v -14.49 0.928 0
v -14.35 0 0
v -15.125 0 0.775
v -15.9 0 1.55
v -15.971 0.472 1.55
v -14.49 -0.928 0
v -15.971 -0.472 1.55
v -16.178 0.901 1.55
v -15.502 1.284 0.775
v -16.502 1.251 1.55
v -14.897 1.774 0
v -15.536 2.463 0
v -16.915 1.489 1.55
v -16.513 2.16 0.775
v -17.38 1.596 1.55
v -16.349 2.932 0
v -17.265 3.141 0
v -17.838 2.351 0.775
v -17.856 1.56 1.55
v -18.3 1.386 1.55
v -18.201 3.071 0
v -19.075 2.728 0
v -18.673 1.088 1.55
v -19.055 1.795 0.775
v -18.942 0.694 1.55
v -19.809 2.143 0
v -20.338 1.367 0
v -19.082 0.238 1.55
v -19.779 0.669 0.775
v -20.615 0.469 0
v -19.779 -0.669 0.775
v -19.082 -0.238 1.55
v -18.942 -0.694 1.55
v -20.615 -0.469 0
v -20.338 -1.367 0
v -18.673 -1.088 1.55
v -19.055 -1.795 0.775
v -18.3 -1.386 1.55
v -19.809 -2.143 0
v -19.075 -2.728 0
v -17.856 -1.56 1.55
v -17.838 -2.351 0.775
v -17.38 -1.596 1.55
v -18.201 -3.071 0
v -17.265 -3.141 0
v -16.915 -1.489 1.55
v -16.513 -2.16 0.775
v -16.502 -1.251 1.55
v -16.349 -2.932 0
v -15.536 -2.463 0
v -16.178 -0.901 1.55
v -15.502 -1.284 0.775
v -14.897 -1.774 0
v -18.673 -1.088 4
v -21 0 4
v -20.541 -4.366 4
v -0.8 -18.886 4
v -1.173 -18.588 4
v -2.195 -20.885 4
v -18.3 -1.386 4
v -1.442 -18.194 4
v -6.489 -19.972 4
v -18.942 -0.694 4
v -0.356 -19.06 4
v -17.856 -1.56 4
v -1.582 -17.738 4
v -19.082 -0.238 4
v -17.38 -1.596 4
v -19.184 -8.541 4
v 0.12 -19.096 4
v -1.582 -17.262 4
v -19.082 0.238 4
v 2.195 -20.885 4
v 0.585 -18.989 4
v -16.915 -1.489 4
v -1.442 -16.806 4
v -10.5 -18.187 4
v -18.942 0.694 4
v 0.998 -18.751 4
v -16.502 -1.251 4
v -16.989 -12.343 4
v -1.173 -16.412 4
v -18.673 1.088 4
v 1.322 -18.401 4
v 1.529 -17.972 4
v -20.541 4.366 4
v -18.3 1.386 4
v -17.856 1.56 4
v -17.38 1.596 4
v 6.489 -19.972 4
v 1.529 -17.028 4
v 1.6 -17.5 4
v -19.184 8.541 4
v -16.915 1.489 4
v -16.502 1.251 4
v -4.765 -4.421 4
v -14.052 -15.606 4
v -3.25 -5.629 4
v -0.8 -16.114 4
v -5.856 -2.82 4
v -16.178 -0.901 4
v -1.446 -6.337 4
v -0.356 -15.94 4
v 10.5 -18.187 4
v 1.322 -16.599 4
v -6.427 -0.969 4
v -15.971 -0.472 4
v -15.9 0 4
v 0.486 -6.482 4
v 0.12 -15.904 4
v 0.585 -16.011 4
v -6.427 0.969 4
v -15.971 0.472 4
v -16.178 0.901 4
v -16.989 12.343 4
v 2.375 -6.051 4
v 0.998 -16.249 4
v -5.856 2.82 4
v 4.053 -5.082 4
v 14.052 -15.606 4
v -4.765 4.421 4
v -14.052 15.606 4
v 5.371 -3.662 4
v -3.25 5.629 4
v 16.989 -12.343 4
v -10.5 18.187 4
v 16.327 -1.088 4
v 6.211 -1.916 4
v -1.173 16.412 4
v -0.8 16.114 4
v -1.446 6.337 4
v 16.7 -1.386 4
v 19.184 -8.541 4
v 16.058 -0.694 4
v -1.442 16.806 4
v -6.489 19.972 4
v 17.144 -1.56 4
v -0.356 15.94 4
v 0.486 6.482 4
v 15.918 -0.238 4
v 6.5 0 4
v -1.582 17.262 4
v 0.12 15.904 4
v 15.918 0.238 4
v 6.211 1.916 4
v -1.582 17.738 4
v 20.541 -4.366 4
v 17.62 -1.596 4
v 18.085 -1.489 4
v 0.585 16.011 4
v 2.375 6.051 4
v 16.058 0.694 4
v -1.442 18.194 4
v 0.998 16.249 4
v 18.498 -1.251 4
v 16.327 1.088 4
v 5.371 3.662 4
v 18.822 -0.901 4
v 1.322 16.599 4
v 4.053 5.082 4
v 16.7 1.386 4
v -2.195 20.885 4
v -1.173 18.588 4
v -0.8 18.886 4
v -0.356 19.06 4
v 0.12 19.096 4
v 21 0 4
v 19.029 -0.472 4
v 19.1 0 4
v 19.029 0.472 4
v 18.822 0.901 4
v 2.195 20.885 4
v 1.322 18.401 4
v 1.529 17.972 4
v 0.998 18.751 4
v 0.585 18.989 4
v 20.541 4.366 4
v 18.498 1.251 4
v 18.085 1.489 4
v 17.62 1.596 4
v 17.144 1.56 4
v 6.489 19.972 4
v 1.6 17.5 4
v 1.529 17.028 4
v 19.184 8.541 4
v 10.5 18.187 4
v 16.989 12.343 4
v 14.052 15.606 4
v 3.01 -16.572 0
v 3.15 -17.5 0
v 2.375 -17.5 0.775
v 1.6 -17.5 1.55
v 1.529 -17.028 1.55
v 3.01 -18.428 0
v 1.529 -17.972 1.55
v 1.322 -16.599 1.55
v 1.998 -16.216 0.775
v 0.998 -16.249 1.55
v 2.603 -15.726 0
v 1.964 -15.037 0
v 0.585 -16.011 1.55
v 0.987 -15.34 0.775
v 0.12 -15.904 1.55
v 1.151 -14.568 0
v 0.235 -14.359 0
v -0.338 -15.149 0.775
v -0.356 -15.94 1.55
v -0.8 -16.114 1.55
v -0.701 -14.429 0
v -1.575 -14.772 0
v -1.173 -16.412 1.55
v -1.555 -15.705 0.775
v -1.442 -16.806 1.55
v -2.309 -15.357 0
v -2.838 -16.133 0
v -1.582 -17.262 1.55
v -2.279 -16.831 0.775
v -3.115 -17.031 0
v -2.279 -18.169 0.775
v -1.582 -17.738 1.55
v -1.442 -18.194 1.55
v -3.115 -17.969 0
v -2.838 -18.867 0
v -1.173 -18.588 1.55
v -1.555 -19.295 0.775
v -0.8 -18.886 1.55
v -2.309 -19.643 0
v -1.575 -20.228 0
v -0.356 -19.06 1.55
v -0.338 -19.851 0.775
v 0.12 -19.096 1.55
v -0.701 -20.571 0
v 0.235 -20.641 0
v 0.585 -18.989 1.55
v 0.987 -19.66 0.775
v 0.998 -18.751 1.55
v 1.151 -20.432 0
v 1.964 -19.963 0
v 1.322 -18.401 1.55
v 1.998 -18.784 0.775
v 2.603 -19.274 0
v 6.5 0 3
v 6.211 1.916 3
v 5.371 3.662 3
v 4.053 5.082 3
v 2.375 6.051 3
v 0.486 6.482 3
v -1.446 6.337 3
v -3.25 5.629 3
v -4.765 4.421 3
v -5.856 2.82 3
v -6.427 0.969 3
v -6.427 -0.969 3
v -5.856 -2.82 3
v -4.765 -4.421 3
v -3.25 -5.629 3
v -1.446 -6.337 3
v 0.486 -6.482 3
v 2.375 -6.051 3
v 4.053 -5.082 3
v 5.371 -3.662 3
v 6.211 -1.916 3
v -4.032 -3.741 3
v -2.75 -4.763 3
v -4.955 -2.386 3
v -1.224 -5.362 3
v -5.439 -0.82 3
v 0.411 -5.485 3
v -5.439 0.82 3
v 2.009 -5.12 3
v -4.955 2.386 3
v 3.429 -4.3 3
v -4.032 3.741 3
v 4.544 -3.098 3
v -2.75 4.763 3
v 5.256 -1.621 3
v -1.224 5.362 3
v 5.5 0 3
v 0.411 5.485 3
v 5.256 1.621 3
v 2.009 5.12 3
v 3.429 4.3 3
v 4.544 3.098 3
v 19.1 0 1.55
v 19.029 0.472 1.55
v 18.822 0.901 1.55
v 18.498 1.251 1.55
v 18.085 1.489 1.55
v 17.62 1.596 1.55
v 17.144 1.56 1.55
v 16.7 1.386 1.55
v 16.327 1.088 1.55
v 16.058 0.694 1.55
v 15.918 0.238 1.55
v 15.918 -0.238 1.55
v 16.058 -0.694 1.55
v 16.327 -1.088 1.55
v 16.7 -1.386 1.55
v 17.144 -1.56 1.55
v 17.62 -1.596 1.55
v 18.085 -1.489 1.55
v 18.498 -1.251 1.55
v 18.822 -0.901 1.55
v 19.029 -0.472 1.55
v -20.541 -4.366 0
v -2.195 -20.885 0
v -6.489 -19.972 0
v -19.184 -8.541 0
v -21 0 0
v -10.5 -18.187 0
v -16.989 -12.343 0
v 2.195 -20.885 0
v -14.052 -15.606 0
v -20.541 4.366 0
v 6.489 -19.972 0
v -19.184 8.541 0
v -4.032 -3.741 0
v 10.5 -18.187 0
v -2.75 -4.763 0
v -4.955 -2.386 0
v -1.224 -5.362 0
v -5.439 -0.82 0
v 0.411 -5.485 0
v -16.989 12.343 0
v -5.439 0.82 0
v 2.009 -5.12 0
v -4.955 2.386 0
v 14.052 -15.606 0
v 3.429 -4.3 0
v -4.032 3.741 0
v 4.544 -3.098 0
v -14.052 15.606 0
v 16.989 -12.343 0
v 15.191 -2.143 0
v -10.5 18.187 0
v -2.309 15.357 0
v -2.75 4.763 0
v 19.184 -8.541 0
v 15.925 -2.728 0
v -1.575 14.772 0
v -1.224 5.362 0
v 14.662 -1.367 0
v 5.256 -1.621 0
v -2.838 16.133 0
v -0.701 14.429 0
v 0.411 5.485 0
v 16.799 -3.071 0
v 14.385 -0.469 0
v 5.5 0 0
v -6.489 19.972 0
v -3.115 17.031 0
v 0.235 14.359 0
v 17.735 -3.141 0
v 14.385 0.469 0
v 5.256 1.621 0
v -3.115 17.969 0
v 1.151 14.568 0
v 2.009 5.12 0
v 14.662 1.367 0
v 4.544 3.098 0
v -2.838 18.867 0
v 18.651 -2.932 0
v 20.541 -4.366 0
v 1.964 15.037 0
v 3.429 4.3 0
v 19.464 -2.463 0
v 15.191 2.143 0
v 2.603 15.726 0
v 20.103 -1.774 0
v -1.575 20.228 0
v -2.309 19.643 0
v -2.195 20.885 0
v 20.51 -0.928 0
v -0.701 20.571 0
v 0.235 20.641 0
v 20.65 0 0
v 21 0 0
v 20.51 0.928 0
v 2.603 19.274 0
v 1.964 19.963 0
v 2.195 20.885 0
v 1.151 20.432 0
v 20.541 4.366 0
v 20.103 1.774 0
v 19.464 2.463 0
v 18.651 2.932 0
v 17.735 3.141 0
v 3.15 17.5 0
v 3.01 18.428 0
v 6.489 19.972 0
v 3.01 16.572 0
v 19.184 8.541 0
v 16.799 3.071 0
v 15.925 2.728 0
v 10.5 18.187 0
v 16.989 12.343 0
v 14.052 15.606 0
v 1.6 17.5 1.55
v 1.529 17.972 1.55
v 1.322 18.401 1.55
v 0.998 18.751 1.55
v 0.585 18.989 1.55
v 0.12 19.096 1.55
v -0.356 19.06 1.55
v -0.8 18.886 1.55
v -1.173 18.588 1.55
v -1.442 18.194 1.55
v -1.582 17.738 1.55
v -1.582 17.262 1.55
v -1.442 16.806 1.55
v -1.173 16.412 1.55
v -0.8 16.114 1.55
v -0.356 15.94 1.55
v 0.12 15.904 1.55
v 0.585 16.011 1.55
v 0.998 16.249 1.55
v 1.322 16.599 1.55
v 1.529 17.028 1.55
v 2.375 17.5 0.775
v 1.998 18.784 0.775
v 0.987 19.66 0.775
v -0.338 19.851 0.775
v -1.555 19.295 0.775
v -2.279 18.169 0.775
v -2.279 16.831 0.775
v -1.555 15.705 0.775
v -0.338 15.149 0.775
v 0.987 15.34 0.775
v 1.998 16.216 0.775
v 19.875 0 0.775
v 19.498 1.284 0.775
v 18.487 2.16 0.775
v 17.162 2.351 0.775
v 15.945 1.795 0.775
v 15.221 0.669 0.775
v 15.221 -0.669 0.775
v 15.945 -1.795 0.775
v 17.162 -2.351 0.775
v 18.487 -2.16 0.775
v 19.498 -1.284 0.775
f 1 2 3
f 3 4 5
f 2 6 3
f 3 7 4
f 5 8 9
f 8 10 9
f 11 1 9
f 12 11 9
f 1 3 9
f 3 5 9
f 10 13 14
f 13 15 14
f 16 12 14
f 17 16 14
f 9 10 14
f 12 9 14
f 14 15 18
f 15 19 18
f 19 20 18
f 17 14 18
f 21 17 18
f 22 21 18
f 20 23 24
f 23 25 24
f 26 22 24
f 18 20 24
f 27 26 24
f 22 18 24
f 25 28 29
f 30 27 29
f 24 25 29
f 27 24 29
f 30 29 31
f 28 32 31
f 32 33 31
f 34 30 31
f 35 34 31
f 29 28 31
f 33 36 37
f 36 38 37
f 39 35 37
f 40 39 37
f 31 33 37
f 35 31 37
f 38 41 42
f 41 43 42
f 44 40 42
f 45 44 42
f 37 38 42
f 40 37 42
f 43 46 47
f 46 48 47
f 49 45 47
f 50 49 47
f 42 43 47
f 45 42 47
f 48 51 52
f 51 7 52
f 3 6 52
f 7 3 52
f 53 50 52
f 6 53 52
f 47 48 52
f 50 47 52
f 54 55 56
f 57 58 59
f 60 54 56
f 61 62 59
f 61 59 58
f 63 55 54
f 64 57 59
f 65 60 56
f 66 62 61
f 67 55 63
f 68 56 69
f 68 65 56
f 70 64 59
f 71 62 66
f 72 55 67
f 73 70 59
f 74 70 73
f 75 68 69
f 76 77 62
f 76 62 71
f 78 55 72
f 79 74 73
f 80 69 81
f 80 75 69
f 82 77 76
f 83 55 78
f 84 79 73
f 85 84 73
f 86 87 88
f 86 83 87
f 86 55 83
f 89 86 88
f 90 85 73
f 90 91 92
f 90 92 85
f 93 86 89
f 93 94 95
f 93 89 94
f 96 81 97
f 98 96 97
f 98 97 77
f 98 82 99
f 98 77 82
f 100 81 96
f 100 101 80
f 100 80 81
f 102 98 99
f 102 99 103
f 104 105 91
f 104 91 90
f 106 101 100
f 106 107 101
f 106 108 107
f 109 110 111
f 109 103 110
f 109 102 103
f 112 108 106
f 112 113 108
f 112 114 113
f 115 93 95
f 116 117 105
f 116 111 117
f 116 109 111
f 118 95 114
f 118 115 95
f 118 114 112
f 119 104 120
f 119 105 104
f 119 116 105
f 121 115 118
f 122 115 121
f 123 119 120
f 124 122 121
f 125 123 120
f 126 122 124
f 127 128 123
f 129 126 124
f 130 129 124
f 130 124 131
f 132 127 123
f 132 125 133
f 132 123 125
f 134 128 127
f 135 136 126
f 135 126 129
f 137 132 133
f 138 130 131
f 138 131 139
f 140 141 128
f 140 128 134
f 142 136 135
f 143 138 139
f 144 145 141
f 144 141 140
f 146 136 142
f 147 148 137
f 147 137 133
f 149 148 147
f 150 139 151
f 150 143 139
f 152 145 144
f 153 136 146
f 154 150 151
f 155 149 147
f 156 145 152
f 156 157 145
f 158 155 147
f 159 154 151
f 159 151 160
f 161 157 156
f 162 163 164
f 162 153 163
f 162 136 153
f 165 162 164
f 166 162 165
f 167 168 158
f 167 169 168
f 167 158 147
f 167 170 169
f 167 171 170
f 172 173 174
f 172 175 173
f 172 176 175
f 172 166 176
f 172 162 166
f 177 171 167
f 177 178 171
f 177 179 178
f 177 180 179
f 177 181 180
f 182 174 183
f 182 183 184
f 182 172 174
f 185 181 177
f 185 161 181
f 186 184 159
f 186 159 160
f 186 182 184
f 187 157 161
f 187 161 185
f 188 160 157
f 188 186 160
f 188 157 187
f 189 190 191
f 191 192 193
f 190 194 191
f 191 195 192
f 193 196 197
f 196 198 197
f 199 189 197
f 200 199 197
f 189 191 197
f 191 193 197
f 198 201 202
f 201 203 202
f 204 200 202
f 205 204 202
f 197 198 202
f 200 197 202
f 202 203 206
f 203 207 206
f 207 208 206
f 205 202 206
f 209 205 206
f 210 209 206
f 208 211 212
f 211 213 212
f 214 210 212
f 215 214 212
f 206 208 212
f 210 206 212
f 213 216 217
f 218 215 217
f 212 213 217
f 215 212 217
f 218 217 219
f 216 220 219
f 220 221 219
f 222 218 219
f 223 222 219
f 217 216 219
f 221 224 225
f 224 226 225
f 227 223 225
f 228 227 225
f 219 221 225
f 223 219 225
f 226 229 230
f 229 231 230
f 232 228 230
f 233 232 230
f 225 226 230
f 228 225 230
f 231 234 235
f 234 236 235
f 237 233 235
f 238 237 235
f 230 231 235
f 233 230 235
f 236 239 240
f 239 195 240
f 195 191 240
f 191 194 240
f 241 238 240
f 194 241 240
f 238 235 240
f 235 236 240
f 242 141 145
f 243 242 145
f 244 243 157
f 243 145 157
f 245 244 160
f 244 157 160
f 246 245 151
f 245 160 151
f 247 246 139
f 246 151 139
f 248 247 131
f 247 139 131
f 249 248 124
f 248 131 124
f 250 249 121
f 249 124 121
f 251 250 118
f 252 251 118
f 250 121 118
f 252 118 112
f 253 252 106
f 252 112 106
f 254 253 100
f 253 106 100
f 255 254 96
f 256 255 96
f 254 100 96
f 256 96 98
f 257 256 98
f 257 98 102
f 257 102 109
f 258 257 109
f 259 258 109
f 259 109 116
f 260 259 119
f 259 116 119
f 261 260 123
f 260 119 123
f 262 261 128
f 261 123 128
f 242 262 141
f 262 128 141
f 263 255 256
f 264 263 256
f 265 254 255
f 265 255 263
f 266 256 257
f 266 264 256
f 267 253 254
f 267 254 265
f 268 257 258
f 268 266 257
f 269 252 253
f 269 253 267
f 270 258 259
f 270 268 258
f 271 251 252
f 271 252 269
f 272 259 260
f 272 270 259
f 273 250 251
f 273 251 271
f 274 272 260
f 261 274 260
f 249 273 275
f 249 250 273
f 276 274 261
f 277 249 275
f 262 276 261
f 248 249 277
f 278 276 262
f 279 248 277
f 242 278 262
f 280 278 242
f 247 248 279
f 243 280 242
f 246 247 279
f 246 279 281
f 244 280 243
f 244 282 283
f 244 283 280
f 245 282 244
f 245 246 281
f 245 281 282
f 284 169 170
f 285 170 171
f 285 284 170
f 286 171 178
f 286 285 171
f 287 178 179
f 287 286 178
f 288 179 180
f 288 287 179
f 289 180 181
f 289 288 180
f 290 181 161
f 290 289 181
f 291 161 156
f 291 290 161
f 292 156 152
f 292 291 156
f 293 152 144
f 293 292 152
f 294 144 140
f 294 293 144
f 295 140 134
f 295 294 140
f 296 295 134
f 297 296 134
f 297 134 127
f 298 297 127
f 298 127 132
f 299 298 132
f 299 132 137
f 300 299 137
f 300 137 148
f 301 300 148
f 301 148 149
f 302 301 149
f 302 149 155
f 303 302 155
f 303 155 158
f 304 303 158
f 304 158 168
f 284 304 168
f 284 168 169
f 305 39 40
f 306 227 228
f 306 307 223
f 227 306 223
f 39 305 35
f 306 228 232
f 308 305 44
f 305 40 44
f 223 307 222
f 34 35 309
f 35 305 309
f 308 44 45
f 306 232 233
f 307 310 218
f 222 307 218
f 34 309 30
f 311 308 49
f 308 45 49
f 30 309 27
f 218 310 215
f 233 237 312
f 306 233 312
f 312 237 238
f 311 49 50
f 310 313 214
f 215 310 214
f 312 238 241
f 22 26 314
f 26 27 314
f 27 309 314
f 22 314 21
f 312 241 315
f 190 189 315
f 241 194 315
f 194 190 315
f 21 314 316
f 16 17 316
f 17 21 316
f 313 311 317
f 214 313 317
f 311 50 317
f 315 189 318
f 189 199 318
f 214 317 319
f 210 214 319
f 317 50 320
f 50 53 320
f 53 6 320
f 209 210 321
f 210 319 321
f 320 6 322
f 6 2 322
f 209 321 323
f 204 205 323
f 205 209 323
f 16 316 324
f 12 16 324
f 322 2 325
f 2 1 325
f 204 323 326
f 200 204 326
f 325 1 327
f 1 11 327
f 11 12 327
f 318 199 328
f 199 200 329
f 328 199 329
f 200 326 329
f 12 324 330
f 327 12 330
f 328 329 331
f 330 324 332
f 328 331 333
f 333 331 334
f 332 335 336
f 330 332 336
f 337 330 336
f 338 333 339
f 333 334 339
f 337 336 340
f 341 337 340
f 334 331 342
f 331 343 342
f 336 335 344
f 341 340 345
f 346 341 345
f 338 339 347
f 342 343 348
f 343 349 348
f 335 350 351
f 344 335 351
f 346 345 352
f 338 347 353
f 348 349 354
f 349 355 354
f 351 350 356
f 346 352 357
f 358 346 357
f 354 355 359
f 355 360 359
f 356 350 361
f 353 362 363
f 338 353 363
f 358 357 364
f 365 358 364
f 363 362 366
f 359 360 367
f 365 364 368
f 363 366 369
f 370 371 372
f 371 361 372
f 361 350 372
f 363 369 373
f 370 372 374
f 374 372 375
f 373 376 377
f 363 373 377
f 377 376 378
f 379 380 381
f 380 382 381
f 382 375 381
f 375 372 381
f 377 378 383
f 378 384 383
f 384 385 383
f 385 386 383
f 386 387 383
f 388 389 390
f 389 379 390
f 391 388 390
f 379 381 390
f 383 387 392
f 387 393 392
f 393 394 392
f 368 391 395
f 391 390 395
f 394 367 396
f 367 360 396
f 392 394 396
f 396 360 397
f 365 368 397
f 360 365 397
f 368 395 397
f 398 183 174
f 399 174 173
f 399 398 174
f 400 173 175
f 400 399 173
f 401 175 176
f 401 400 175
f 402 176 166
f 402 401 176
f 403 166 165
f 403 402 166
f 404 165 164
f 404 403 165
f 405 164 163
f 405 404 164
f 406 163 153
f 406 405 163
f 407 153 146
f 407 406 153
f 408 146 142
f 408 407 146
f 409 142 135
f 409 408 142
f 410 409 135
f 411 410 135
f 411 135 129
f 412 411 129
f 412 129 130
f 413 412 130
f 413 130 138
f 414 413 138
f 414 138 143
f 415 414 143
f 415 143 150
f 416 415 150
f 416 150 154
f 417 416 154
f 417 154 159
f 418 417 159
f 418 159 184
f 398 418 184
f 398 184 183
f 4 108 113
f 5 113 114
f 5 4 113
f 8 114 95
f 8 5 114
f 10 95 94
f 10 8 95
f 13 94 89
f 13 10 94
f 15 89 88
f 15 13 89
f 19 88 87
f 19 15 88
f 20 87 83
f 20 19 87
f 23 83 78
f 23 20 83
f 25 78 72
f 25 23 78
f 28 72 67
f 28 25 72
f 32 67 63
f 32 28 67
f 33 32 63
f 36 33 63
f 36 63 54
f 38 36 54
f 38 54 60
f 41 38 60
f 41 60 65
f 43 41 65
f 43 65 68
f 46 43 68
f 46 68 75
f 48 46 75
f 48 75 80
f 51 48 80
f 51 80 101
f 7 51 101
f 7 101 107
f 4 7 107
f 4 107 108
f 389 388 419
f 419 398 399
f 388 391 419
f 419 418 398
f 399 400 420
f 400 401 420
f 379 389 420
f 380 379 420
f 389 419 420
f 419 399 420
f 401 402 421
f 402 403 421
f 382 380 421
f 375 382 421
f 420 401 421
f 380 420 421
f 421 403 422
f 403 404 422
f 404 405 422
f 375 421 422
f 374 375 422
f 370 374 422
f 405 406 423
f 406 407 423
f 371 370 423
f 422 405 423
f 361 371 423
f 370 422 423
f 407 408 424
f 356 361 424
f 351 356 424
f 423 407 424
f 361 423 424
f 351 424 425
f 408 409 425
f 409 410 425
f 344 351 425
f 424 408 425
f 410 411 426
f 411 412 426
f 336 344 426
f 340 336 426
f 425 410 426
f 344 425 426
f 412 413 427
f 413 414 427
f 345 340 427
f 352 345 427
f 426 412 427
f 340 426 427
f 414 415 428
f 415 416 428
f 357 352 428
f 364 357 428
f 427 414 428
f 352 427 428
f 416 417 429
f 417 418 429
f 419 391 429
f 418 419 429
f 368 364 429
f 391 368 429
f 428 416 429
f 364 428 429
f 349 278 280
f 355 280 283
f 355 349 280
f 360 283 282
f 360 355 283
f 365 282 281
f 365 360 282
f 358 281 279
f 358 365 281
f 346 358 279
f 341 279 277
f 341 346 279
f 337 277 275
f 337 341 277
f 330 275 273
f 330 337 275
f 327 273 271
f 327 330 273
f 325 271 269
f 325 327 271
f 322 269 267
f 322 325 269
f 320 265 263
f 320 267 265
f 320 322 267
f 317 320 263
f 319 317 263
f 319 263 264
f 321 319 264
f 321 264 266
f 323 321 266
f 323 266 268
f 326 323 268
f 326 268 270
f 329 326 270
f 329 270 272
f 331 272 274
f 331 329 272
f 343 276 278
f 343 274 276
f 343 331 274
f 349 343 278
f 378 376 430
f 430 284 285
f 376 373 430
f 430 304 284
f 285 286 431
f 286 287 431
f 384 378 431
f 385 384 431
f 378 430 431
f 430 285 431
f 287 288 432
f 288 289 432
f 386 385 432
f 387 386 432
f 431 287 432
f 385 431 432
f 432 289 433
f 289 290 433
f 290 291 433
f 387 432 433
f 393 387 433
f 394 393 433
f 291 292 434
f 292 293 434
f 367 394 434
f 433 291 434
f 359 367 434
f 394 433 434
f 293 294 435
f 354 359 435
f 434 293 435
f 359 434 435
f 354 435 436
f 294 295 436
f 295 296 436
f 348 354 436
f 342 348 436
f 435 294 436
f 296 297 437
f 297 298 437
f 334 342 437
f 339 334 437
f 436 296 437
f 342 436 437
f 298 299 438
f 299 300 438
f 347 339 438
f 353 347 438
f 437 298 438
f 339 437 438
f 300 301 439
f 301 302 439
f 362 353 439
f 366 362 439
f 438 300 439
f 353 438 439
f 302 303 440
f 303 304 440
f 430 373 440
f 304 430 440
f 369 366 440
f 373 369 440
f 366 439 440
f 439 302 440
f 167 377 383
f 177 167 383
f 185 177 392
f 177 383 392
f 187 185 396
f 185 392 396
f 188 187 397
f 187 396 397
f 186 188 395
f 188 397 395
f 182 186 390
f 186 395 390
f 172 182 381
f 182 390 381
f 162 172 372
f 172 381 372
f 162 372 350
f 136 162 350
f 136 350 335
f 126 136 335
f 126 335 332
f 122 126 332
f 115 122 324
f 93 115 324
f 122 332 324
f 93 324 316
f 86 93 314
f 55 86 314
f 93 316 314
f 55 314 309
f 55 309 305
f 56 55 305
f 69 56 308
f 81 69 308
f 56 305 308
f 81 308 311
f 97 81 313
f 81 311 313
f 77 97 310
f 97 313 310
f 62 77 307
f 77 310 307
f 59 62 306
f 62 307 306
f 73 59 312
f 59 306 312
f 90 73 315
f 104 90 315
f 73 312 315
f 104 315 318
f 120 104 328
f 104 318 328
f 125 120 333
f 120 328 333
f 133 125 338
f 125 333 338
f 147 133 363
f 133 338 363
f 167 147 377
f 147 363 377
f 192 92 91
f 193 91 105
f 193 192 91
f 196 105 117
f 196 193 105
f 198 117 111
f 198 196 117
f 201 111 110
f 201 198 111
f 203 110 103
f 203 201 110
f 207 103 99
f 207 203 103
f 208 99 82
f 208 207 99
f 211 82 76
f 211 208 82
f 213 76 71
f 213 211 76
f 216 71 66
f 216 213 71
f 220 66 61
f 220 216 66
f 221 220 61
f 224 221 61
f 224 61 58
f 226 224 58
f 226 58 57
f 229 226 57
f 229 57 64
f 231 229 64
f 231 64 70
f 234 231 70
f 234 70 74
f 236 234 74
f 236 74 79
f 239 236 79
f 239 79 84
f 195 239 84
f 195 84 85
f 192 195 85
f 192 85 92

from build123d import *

# Parameters (mm, degrees)
SKETCH1_R                                       = 21
SKETCH1_R_2                                     = 1.6
SKETCH1_R_3                                     = 5.5
BOSS_EXTRUDE1_DEPTH                             = 4
SKETCH2_R                                       = 6.5
CUT_EXTRUDE1_DEPTH                              = 1
CSK_FOR_M3_FLAT_HEAD_MACHINE_SCREW1_D           = 3.2
CSK_FOR_M3_FLAT_HEAD_MACHINE_SCREW1_CSINK_D     = 6.3
CSK_FOR_M3_FLAT_HEAD_MACHINE_SCREW1_CSINK_ANGLE = 90


with BuildPart() as part:
    # Sketch1 → Boss-Extrude1 (new body)
    with BuildSketch(Plane.XY):
        Circle(SKETCH1_R)
        with Locations((0, 17.5)):
            Circle(SKETCH1_R_2, mode=Mode.SUBTRACT)
        with Locations((17.5, 0)):
            Circle(SKETCH1_R_2, mode=Mode.SUBTRACT)
        with Locations((0, -17.5)):
            Circle(SKETCH1_R_2, mode=Mode.SUBTRACT)
        with Locations((-17.5, 0)):
            Circle(SKETCH1_R_2, mode=Mode.SUBTRACT)
        Circle(SKETCH1_R_3, mode=Mode.SUBTRACT)
    extrude(amount=BOSS_EXTRUDE1_DEPTH)

    # Sketch2 → Cut-Extrude1 (cut)
    with BuildSketch(Plane.XY.offset(4)):
        Circle(SKETCH2_R)
    extrude(amount=-CUT_EXTRUDE1_DEPTH, mode=Mode.SUBTRACT)

    # CSK for M3 Flat Head Machine Screw1 (through all)
    with Locations(Plane(origin=(0, 0, 0), x_dir=(-1, 0, 0), z_dir=(0, 0, -1))):
        with Locations((17.5, 0), (0, 17.5), (-17.5, 0), (0, -17.5)):
            CounterSinkHole(CSK_FOR_M3_FLAT_HEAD_MACHINE_SCREW1_D / 2, CSK_FOR_M3_FLAT_HEAD_MACHINE_SCREW1_CSINK_D / 2, counter_sink_angle=CSK_FOR_M3_FLAT_HEAD_MACHINE_SCREW1_CSINK_ANGLE)


solid = part.part
